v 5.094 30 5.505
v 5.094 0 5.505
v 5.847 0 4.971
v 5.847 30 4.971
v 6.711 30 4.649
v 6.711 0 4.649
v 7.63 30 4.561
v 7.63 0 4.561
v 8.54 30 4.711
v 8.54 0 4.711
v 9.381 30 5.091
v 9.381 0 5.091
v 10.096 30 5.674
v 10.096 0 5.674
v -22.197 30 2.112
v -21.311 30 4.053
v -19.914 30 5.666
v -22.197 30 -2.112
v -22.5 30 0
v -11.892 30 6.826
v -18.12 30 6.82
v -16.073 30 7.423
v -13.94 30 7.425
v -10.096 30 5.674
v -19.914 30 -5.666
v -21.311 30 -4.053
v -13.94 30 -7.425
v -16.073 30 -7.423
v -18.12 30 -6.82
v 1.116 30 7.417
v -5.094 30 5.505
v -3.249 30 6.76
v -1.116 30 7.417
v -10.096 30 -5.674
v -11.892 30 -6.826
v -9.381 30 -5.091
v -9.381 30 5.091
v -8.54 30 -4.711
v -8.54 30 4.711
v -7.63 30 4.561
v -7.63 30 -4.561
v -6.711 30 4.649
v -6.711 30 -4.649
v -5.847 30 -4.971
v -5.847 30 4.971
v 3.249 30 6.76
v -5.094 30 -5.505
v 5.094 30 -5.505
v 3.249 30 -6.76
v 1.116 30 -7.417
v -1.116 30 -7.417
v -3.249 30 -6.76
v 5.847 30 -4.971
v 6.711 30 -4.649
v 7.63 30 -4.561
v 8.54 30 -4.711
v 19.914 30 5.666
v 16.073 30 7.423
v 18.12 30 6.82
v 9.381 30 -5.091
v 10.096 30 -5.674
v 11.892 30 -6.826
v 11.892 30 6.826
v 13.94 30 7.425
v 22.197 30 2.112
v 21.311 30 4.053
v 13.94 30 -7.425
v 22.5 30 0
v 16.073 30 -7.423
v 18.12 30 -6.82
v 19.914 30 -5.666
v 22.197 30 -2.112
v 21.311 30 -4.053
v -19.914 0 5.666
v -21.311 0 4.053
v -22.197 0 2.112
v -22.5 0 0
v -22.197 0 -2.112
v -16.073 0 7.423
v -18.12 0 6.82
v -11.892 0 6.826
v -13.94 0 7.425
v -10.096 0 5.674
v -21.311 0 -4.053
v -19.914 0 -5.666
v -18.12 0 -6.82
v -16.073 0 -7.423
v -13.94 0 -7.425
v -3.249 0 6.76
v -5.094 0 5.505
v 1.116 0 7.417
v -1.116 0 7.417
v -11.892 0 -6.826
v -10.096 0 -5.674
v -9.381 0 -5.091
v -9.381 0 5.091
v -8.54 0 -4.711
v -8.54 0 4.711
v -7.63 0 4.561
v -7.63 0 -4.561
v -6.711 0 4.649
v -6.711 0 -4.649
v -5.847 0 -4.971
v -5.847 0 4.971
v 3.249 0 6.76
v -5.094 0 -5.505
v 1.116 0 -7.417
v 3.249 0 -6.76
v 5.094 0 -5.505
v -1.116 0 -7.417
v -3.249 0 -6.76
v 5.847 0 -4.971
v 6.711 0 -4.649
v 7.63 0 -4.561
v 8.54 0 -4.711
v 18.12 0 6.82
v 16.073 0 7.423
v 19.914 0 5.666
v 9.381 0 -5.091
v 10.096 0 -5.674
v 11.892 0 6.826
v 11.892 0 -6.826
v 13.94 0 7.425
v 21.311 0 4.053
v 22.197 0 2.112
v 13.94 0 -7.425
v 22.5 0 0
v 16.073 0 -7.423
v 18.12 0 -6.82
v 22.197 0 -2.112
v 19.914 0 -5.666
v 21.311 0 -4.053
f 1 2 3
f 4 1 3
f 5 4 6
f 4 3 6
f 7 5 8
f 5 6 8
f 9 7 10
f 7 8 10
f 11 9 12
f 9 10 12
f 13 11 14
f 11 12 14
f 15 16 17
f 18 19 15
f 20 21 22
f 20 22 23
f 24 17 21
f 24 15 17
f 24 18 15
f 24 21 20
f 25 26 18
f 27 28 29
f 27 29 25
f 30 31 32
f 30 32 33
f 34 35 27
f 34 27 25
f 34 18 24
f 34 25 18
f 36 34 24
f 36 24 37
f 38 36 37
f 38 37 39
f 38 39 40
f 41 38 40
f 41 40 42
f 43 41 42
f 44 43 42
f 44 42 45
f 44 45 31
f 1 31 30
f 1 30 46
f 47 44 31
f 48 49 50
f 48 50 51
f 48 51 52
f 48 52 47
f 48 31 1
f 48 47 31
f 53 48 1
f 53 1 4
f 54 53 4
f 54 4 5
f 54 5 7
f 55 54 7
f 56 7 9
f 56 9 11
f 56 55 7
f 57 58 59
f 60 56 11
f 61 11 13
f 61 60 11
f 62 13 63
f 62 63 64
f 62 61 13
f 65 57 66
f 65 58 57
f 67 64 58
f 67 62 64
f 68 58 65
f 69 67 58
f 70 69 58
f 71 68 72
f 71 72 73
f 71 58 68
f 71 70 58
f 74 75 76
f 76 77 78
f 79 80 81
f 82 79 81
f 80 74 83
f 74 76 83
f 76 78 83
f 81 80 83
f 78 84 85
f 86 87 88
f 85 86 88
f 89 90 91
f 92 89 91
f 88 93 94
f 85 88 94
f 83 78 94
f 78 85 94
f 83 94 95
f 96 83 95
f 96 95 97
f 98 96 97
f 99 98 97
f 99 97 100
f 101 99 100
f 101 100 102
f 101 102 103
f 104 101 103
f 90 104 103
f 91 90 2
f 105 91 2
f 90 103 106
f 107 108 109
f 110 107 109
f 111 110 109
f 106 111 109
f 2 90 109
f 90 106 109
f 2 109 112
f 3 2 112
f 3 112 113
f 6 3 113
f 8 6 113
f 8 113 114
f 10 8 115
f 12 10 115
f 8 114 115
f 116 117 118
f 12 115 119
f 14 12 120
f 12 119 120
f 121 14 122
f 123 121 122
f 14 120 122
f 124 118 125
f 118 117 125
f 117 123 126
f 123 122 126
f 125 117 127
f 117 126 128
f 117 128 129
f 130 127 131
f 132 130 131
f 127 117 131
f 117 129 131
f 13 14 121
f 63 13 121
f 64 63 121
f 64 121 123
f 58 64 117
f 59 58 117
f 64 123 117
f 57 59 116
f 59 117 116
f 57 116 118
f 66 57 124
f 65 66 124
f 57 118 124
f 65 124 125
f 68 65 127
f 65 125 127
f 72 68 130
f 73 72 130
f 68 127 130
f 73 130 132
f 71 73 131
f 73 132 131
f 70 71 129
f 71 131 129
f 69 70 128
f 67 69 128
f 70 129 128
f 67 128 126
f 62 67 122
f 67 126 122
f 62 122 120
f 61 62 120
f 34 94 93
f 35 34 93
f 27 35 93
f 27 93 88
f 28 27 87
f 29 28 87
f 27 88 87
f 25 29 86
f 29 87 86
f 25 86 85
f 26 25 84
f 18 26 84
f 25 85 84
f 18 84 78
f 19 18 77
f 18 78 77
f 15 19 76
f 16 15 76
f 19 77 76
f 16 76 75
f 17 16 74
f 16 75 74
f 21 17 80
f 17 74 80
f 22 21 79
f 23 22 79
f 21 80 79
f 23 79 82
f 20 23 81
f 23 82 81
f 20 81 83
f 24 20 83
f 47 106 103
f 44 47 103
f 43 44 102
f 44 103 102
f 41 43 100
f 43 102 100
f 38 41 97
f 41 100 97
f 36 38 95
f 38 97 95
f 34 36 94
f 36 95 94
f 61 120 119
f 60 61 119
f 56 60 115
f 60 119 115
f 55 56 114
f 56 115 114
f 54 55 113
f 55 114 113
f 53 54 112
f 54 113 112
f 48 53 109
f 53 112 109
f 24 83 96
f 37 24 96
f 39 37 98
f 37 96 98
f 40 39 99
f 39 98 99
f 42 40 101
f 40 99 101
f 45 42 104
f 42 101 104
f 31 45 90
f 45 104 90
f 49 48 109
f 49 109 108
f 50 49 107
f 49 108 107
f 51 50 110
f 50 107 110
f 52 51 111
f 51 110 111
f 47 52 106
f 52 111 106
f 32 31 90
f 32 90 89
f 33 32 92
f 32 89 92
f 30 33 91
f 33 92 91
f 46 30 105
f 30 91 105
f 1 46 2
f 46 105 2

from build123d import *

# Parameters (mm, degrees)
SALIENTE_EXTRUIR1_DEPTH = 30


with BuildPart() as part:
    # Croquis1 → Saliente-Extruir1 (new body)
    with BuildSketch(Plane(origin=(0, 0, 0), x_dir=(1, 0, 0), z_dir=(0, 1, 0))):
        with BuildLine():
            ThreePointArc((5.093864637, 5.504774569), (0, 7.5), (-5.093864637, 5.504774569))
            ThreePointArc((-5.093864637, 5.504774569), (-7.629622361, 4.56075577), (-10.095654419, 5.674274793))
            ThreePointArc((-10.095654419, 5.674274793), (-22.5, 0), (-10.095654419, -5.674274793))
            ThreePointArc((-10.095654419, -5.674274793), (-7.629622361, -4.56075577), (-5.093864637, -5.504774569))
            ThreePointArc((-5.093864637, -5.504774569), (0, -7.5), (5.093864637, -5.504774569))
            ThreePointArc((5.093864637, -5.504774569), (7.629622361, -4.56075577), (10.095654419, -5.674274793))
            ThreePointArc((10.095654419, -5.674274793), (22.5, 0), (10.095654419, 5.674274793))
            ThreePointArc((10.095654419, 5.674274793), (7.629622361, 4.56075577), (5.093864637, 5.504774569))
        make_face()
    extrude(amount=SALIENTE_EXTRUIR1_DEPTH)


solid = part.part
